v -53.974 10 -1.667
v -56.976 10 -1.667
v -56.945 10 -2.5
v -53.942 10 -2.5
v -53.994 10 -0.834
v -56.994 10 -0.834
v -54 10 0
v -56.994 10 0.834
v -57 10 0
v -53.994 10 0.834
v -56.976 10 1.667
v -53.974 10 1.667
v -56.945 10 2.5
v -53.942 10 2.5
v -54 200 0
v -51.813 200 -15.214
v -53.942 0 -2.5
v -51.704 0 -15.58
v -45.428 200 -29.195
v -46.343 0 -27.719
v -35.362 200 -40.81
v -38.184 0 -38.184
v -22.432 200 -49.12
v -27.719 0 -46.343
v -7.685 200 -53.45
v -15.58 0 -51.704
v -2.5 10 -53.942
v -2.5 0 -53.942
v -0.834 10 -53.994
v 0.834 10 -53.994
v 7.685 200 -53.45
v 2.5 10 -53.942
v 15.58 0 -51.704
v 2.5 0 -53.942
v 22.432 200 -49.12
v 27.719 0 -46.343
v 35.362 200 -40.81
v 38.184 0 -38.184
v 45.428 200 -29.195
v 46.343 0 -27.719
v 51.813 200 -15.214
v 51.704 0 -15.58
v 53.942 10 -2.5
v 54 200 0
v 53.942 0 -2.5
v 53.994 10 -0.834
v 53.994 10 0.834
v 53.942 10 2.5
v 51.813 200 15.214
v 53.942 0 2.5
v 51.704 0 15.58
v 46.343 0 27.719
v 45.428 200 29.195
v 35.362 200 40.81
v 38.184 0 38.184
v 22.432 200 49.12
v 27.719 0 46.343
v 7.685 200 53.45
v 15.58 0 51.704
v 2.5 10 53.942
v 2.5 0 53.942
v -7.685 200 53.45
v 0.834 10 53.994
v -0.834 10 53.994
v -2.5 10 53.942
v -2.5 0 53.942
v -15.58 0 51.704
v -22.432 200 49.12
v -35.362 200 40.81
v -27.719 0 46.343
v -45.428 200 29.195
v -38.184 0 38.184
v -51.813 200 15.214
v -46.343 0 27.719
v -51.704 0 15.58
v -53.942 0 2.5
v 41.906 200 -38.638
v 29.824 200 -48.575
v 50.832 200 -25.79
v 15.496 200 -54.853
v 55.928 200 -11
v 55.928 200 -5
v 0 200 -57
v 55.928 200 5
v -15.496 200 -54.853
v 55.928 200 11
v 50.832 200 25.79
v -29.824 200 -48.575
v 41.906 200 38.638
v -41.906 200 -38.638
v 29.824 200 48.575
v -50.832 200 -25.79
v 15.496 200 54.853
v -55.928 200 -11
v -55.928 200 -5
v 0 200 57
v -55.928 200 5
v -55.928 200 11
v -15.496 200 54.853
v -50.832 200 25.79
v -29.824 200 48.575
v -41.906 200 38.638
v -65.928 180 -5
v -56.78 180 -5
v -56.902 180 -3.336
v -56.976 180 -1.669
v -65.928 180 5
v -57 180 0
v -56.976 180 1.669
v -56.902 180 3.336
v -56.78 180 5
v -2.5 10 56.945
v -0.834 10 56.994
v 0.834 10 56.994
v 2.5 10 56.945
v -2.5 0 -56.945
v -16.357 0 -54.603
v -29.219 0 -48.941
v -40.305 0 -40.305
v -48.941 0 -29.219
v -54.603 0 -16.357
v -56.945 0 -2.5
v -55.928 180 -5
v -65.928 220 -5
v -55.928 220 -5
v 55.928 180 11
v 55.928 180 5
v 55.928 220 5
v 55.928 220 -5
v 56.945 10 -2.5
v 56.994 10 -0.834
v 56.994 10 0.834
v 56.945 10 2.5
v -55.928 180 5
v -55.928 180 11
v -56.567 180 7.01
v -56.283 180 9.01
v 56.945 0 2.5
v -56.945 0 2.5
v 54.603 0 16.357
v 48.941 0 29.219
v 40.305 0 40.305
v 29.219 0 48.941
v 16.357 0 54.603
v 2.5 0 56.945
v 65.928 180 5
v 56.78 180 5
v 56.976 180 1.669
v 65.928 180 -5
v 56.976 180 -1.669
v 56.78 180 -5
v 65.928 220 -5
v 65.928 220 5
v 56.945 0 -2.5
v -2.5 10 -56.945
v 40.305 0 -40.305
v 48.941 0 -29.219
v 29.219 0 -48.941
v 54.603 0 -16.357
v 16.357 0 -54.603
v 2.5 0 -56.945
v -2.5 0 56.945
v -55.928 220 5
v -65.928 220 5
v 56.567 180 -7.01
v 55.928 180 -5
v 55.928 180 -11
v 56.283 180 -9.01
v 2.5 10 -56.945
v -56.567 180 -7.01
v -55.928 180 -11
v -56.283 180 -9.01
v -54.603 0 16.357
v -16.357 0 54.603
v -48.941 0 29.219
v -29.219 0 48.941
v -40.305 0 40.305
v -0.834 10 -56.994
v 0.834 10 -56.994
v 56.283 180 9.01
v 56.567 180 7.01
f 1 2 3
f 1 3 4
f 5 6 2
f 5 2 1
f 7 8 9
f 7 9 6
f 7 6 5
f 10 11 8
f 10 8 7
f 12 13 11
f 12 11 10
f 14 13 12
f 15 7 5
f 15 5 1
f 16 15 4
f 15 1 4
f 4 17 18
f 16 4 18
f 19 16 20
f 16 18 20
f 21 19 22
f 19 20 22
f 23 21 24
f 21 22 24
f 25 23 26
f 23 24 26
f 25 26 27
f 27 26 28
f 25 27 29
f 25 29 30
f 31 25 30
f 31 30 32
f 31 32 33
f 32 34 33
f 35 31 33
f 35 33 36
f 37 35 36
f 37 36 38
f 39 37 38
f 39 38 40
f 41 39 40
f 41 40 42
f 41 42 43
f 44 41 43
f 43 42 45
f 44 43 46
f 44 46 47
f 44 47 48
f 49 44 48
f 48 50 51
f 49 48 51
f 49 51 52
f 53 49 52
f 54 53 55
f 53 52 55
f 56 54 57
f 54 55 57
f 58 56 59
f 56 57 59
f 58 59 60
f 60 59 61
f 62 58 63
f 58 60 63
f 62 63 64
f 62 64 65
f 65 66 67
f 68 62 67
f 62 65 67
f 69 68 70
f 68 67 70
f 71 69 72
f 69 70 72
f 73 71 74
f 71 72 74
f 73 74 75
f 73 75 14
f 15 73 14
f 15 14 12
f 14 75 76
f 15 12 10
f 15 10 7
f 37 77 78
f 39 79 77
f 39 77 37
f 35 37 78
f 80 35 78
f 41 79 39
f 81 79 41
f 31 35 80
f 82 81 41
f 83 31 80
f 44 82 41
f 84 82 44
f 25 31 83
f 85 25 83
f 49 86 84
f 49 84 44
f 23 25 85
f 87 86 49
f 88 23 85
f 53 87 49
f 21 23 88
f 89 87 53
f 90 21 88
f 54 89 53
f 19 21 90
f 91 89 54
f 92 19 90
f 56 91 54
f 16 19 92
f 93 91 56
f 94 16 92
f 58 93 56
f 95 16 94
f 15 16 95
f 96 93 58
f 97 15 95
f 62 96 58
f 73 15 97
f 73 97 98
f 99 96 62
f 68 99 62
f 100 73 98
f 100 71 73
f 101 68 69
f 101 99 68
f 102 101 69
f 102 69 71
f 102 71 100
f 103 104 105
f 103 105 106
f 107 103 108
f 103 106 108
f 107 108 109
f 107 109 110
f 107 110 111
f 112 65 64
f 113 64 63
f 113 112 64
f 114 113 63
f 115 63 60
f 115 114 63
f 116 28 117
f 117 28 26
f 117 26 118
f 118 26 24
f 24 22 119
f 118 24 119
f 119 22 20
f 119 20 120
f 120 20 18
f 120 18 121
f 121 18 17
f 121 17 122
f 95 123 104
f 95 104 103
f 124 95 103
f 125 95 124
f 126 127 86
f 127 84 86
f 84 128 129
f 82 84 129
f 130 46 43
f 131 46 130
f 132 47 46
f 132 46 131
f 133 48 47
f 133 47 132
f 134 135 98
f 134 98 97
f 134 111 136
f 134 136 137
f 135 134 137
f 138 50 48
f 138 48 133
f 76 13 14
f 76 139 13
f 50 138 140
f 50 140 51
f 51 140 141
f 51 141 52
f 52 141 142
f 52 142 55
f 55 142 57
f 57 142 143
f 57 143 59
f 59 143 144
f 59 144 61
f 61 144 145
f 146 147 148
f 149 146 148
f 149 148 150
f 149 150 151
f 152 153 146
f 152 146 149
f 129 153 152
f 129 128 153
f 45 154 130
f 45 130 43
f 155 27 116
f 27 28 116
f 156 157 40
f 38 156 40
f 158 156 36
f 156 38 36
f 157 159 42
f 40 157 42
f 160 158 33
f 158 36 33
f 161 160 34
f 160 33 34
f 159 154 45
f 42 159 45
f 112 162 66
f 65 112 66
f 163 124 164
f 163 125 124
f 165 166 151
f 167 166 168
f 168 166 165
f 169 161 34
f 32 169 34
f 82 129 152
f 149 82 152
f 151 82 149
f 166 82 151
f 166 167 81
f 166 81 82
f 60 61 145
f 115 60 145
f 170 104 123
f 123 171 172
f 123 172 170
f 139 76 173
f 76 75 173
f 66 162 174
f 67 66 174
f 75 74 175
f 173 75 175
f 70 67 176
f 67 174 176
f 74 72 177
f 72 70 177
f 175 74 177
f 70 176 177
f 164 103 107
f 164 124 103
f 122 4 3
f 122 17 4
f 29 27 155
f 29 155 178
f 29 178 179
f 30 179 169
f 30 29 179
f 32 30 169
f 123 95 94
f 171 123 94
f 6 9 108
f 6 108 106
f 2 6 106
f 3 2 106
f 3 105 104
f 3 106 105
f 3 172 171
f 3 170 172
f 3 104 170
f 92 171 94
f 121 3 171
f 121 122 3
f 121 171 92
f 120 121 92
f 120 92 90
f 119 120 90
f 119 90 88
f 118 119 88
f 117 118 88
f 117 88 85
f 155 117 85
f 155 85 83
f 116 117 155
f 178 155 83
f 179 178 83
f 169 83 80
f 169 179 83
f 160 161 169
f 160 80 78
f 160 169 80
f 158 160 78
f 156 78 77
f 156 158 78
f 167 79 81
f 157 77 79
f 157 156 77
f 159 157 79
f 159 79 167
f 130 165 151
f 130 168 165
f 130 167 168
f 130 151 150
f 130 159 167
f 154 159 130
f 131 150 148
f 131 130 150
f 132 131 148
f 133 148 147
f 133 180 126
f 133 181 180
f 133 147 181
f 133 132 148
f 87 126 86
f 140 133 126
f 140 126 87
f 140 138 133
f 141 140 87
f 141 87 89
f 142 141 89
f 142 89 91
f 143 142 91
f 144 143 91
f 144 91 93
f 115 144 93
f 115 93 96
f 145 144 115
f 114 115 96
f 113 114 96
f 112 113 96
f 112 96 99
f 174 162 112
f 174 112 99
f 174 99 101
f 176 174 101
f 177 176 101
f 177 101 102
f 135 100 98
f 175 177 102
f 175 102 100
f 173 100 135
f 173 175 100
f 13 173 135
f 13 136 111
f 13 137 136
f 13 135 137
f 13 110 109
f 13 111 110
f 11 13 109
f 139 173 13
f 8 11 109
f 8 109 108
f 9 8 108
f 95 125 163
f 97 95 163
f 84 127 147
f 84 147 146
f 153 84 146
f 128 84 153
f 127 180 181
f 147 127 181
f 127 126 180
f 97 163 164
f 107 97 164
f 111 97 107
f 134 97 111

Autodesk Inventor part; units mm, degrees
ref_plane "YZ Plane" through (0, 0, 0) normal (1, 0, 0) x (0, 1, 0)
ref_plane "XZ Plane" through (0, 0, 0) normal (0, 1, 0) x (-1, 0, 0)
ref_plane "XY Plane" through (0, 0, 0) normal (0, 0, 1) x (1, 0, 0)
sketch "Sketch1" plane through (0, 0, 0) normal (0, 1, 0) x (-1, 0, 0)
  circle A0 centre (0, 0) radius 54
  circle A1 centre (0, 0) radius 57
  dimension "d0" = 3
  dimension "d1" = 114
extrude "Extrusion1" add sketch "Sketch1" along normal blind 200
sketch "Sketch2" plane through (0, 200, 0) normal (0, 1, 0) x (1, 0, 0)
  circle A0 centre (0, 0) radius 57 projected
  line L0 (55.9285, -11) -> (-55.9285, -11)
  line L1 (-55.9285, -11) -> (-55.9285, 11)
  line L2 (-55.9285, 11) -> (55.9285, 11)
  line L3 (55.9285, 11) -> (55.9285, -11)
  line L4 (55.9285, -11) -> (-55.9285, 11) construction
  line L5 (-55.9285, -11) -> (55.9285, 11) construction
  dimension "d4" = 22
extrude "Extrusion2" cut sketch "Sketch2" against normal blind 20 contours A0 L3 | L1 A0
sketch "Sketch3" plane through (-55.9285, 200, -11) normal (-1, 0, 0) x (0, 0, 1)
  line L0 (0, -20) -> (22, -20) projected
  line L1 (16, -20) -> (6, -20)
  line L2 (6, -20) -> (6, 20)
  line L3 (6, 20) -> (16, 20)
  line L4 (16, 20) -> (16, -20)
  line L5 (0, -20) -> (0, 0) projected
  point P0 (11, -200)
  point P1 (6, 0)
  point P2 (6, -20)
  dimension "d7" = 40
  dimension "d8" = 10
  dimension "d9" = 6
extrude "Extrusion3" add sketch "Sketch3" along normal blind 10
mirror "Mirror1" about plane through (0, 0, 0) normal (1, 0, 0) of "Extrusion3"
sketch "Sketch4" plane through (0, 0, 0) normal (0, -1, 0) x (1, 0, 0)
  line L0 (-2.5, -60) -> (2.5, -60)
  line L1 (2.5, -60) -> (2.5, 60)
  line L2 (2.5, 60) -> (-2.5, 60)
  line L3 (-2.5, 60) -> (-2.5, -60)
  line L4 (-2.5, -60) -> (2.5, 60) construction
  line L5 (2.5, -60) -> (-2.5, 60) construction
  line L6 (60, -2.5) -> (-60, -2.5)
  line L7 (-60, -2.5) -> (-60, 2.5)
  line L8 (-60, 2.5) -> (60, 2.5)
  line L9 (60, 2.5) -> (60, -2.5)
  line L10 (60, -2.5) -> (-60, 2.5) construction
  line L11 (-60, -2.5) -> (60, 2.5) construction
  point P0 (0, 0)
  point P1 (-2.5, -2.5)
  point P2 (2.5, -2.5)
  point P3 (2.5, 2.5)
  point P4 (-2.5, 2.5)
  dimension "d12" = 5
  dimension "d13" = 5
  dimension "d14" = 120
  dimension "d15" = 120
extrude "Extrusion4" cut sketch "Sketch4" against normal blind 10
equation "\"d13\" = d12"
equation "\"d15\" = d14"
properties part number "Cooking Pipe"
